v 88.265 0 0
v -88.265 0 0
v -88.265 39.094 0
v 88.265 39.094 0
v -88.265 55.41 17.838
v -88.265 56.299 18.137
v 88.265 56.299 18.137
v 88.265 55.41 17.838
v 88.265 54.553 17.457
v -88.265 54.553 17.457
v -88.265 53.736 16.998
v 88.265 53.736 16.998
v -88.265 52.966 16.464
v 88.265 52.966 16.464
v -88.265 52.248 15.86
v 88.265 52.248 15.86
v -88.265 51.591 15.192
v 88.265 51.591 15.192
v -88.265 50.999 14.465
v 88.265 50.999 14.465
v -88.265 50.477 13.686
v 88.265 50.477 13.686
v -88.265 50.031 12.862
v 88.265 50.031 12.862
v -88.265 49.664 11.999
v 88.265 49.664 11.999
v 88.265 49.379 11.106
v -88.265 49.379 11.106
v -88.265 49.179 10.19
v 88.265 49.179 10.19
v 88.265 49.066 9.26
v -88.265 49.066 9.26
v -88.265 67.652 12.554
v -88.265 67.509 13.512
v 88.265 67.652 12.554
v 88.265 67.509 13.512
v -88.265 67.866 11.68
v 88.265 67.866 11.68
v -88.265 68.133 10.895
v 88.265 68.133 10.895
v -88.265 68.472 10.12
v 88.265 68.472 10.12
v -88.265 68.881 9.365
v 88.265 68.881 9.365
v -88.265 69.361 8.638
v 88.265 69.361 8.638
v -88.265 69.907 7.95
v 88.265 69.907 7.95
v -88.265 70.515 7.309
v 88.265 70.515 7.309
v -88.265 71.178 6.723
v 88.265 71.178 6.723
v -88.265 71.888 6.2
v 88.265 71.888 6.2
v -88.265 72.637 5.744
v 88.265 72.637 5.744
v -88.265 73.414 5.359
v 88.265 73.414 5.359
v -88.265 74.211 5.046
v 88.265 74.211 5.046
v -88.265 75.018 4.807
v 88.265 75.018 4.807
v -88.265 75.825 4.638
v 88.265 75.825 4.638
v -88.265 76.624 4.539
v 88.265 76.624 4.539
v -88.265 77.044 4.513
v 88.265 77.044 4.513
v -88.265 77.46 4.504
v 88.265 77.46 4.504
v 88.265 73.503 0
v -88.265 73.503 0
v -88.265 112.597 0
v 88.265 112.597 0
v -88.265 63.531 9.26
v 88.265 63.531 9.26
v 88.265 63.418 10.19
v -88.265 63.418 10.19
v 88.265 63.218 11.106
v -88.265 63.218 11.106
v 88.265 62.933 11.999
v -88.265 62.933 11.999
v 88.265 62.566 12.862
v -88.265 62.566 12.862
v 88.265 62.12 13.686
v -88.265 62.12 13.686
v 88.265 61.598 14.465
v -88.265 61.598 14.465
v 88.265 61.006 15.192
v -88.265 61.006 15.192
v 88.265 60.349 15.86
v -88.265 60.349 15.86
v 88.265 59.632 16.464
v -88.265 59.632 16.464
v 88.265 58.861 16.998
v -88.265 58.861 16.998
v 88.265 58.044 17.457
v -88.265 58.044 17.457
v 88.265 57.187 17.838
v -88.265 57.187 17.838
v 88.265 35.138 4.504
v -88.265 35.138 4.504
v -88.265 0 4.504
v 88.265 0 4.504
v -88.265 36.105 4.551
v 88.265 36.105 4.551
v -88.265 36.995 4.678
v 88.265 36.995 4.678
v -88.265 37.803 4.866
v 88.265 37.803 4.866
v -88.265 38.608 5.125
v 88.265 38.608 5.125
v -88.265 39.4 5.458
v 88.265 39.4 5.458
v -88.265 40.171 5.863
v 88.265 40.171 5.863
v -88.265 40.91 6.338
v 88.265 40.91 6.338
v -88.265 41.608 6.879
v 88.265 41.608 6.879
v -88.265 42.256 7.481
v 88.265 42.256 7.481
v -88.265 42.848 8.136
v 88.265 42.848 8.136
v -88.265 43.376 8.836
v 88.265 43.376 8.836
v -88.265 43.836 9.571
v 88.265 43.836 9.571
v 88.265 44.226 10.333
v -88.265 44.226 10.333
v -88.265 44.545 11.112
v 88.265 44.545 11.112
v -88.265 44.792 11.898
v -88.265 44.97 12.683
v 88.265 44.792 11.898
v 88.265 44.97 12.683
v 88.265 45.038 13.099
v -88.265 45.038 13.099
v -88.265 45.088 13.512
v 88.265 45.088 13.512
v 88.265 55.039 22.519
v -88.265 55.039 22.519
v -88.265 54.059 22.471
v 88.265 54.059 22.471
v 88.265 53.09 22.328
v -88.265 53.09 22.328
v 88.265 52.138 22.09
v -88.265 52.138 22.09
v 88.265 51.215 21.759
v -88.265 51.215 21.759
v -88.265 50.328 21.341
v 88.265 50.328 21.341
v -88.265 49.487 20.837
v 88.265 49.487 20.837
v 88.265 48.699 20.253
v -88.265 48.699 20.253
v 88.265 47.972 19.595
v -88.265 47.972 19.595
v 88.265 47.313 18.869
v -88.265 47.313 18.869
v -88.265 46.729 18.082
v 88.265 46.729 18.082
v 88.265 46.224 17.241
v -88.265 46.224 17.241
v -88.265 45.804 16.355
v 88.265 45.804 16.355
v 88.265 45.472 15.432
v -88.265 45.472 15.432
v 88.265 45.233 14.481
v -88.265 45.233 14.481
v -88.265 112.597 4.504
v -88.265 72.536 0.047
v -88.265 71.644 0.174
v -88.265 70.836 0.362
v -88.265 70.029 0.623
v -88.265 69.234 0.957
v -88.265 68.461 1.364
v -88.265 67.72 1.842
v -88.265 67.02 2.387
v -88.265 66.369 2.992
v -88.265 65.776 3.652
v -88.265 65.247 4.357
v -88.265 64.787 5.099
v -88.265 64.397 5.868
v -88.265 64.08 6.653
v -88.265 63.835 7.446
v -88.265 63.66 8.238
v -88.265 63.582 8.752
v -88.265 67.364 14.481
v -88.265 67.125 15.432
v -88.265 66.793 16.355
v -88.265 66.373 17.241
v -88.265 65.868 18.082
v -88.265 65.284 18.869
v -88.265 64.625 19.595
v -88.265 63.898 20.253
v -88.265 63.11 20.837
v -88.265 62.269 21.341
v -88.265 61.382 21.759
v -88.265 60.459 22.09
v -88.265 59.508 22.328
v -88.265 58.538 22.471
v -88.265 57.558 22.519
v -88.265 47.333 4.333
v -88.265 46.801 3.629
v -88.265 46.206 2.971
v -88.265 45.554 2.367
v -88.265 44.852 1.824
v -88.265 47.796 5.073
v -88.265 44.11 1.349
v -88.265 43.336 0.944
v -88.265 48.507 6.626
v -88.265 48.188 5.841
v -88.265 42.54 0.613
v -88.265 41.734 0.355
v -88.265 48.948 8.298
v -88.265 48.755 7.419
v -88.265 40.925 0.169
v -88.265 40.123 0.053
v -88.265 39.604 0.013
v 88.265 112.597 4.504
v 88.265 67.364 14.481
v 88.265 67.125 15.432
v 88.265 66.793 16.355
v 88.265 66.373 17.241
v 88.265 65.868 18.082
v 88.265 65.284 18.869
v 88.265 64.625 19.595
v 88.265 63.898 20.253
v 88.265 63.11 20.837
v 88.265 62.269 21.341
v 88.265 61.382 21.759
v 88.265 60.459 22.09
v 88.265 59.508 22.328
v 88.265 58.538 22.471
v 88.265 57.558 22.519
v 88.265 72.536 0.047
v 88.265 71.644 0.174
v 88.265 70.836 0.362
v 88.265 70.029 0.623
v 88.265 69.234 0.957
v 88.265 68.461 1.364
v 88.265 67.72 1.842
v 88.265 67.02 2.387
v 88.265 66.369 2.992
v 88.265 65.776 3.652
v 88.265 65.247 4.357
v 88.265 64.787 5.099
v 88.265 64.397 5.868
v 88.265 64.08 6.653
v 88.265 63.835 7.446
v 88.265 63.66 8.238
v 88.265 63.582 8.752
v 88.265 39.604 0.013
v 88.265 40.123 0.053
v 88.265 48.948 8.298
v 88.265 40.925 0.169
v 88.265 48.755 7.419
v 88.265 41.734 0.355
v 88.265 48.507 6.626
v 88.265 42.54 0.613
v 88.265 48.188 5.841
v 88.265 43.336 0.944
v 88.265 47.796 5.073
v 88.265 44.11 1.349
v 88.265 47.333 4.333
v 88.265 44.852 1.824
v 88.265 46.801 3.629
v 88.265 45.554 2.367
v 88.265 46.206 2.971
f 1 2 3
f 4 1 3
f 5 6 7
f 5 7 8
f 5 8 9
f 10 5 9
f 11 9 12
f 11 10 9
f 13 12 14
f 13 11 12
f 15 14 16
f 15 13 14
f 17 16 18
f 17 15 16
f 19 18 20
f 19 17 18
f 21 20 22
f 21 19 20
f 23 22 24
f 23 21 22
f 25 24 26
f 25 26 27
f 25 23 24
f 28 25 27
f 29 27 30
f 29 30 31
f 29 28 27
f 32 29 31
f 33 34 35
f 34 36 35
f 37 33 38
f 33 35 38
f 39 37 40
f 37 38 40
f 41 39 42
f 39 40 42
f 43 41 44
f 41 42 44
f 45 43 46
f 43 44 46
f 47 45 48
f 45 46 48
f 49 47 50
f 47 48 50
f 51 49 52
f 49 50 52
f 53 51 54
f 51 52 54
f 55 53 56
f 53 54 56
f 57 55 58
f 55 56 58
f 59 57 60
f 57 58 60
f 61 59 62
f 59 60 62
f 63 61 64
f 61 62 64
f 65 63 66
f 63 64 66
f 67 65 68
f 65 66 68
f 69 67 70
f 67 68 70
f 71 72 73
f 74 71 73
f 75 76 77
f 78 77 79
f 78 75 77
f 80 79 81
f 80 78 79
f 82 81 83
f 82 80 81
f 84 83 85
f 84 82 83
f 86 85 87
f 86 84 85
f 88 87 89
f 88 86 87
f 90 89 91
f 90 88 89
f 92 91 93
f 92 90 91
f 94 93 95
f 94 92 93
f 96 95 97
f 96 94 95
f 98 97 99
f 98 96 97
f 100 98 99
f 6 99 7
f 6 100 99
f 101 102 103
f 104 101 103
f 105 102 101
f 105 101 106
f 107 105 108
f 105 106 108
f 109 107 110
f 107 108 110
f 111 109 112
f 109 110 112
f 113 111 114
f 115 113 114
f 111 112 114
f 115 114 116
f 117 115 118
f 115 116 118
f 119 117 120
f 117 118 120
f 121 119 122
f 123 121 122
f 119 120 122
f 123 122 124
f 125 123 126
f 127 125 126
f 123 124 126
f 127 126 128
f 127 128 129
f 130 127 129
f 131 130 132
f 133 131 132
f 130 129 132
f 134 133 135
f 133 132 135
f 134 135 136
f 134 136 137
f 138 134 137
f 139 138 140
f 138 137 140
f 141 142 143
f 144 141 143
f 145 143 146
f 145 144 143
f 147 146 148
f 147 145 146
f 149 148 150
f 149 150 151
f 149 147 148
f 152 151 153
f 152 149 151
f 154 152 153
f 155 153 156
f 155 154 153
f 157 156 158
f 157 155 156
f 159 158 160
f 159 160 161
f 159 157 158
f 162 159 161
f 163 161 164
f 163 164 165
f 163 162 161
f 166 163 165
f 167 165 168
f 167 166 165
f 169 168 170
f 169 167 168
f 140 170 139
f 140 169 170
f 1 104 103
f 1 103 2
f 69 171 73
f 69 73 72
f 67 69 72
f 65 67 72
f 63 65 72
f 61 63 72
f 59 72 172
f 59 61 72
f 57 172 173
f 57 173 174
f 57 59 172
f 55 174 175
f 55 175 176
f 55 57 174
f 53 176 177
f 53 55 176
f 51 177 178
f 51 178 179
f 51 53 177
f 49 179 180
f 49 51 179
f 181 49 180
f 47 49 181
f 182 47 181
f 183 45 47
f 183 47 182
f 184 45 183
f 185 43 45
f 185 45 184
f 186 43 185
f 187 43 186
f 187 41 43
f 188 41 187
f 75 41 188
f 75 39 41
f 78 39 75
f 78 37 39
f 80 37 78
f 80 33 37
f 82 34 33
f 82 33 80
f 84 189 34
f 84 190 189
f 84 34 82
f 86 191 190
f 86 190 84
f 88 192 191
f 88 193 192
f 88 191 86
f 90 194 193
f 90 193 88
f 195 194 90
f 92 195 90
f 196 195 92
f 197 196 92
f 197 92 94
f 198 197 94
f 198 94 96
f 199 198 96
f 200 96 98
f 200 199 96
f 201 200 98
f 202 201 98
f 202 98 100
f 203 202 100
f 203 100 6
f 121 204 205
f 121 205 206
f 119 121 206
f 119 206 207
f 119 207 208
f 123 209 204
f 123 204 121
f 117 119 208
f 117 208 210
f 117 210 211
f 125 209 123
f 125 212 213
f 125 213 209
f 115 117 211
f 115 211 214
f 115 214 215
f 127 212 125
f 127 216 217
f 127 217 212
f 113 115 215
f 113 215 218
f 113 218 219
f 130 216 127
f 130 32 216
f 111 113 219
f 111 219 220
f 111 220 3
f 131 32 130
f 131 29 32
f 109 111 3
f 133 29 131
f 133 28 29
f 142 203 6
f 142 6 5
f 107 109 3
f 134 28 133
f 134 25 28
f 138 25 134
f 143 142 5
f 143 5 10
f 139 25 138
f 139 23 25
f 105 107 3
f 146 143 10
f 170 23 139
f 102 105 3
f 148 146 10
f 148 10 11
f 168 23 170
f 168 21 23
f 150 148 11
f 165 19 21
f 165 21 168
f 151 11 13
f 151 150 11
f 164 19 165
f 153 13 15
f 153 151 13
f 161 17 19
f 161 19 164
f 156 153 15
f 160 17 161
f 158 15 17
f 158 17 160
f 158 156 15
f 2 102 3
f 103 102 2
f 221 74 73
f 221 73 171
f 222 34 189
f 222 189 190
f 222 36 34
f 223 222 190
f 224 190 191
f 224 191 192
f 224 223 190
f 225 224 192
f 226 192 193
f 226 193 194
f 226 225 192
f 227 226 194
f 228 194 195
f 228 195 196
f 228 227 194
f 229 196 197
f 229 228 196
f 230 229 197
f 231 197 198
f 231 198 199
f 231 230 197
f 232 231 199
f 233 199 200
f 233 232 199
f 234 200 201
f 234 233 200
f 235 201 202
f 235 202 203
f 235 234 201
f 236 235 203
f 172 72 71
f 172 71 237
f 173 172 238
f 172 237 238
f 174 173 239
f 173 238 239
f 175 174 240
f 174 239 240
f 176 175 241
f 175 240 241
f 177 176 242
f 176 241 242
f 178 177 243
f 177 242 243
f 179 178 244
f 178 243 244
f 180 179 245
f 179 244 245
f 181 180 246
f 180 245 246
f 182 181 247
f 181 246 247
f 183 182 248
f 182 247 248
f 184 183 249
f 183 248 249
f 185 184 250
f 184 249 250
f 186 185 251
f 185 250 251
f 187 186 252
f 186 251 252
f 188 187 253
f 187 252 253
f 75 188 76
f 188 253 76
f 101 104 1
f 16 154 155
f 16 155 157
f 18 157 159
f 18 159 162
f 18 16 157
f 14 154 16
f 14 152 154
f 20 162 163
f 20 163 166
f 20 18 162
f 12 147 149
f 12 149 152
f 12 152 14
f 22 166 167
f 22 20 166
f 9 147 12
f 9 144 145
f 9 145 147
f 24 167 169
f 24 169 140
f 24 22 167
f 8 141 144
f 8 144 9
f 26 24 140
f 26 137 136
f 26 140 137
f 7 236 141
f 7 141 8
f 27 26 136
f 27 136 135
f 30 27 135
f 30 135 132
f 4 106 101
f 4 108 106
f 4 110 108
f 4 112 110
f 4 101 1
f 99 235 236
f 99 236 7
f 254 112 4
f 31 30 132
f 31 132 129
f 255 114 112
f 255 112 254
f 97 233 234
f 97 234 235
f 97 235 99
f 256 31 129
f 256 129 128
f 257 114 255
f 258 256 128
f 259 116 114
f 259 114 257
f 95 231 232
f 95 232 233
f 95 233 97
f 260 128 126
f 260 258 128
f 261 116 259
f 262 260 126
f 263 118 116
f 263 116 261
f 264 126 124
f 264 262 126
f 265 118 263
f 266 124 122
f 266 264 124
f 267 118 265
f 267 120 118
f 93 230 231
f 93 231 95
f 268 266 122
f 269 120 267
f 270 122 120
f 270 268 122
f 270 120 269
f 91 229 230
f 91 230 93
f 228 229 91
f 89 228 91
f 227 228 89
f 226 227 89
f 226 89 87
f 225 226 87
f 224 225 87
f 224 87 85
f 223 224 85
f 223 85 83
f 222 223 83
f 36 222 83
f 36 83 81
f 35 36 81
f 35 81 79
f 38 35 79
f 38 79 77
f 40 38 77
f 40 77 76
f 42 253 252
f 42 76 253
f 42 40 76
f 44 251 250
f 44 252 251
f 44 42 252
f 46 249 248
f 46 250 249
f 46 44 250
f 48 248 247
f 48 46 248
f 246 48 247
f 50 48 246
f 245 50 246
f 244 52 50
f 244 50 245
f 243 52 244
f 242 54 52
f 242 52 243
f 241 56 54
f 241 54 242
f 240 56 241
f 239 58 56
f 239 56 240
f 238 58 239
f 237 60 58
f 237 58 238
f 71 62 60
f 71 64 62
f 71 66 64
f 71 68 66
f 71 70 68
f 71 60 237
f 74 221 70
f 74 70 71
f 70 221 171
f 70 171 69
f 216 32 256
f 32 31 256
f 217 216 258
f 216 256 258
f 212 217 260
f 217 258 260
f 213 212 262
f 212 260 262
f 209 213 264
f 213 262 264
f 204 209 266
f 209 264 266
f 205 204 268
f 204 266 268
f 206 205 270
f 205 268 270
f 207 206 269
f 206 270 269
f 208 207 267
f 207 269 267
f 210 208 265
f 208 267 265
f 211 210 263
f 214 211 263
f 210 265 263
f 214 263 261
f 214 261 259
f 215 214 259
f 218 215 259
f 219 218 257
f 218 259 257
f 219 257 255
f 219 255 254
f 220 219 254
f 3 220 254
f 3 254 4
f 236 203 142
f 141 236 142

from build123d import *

# Parameters (mm, degrees)
SM_START               = -88.265
SM_BASE_FLANGE_1_DEPTH = 176.53
FILLET_3_R             = 10
FILLET_4_R             = 10
FILLET_5_R             = 10
FILLET_6_R             = 10
FILLET_7_R             = 10


# Read off the part's stored shape, not the designer's step: 基体-法兰1
with BuildPart() as part:
    # 基体-法兰1 outline → 基体-法兰1 (new body)
    with BuildSketch(Plane(origin=(0, 0, 0), x_dir=(0, 0, -1), z_dir=(1, 0, 0)).offset(SM_START)):
        Polygon((-4.503882243, 0), (0, 0), (0, 49.038822429), (-18.519411214, 49.038822429), (-18.519411214, 63.558233643), (0, 63.558233643), (0, 112.597056072), (-4.503882243, 112.597056072), (-4.503882243, 67.558233643), (-22.519411214, 67.558233643), (-22.519411214, 45.038822429), (-4.503882243, 45.038822429), align=None)
    extrude(amount=SM_BASE_FLANGE_1_DEPTH)

    # 圆角3
    fillet_3_edges = [part.edges().sort_by_distance(p)[0] for p in [
        (0, 45.038822429, 22.519411214),
        (0, 67.558233643, 22.519411214),
    ]]
    fillet(fillet_3_edges, radius=FILLET_3_R)

    # 圆角4
    # the kernel refuses this fillet: 10 mm, written as the material it adds along each edge
    with BuildSketch(Plane(origin=(-88.265, 49.038822429, 18.519411214), x_dir=(0, 1, 0), z_dir=(1, 0, 0)), Plane(origin=(-88.265, 63.558233643, 18.519411214), x_dir=(0, 0, -1), z_dir=(1, 0, 0))) as fillet_4_piece_1:
        with BuildLine():
            CenterArc((FILLET_4_R, -FILLET_4_R), FILLET_4_R, 90, 90)
            Line((0, -FILLET_4_R), (0, 0))
            Line((0, 0), (FILLET_4_R, 0))
        make_face()
    extrude(amount=176.53)

    # 圆角5
    fillet_5_edges = [part.edges().sort_by_distance(p)[0] for p in [
        (0, 63.558233643, 0),
        (0, 49.038822429, 0),
    ]]
    fillet(fillet_5_edges, radius=FILLET_5_R)

    # 圆角6
    fillet_6_edges = [part.edges().sort_by_distance(p)[0] for p in [
        (0, 45.038822429, 4.503882243),
    ]]
    fillet(fillet_6_edges, radius=FILLET_6_R)

    # 圆角7
    fillet_7_edges = [part.edges().sort_by_distance(p)[0] for p in [
        (0, 67.558233643, 4.503882243),
    ]]
    fillet(fillet_7_edges, radius=FILLET_7_R)


solid = part.part
